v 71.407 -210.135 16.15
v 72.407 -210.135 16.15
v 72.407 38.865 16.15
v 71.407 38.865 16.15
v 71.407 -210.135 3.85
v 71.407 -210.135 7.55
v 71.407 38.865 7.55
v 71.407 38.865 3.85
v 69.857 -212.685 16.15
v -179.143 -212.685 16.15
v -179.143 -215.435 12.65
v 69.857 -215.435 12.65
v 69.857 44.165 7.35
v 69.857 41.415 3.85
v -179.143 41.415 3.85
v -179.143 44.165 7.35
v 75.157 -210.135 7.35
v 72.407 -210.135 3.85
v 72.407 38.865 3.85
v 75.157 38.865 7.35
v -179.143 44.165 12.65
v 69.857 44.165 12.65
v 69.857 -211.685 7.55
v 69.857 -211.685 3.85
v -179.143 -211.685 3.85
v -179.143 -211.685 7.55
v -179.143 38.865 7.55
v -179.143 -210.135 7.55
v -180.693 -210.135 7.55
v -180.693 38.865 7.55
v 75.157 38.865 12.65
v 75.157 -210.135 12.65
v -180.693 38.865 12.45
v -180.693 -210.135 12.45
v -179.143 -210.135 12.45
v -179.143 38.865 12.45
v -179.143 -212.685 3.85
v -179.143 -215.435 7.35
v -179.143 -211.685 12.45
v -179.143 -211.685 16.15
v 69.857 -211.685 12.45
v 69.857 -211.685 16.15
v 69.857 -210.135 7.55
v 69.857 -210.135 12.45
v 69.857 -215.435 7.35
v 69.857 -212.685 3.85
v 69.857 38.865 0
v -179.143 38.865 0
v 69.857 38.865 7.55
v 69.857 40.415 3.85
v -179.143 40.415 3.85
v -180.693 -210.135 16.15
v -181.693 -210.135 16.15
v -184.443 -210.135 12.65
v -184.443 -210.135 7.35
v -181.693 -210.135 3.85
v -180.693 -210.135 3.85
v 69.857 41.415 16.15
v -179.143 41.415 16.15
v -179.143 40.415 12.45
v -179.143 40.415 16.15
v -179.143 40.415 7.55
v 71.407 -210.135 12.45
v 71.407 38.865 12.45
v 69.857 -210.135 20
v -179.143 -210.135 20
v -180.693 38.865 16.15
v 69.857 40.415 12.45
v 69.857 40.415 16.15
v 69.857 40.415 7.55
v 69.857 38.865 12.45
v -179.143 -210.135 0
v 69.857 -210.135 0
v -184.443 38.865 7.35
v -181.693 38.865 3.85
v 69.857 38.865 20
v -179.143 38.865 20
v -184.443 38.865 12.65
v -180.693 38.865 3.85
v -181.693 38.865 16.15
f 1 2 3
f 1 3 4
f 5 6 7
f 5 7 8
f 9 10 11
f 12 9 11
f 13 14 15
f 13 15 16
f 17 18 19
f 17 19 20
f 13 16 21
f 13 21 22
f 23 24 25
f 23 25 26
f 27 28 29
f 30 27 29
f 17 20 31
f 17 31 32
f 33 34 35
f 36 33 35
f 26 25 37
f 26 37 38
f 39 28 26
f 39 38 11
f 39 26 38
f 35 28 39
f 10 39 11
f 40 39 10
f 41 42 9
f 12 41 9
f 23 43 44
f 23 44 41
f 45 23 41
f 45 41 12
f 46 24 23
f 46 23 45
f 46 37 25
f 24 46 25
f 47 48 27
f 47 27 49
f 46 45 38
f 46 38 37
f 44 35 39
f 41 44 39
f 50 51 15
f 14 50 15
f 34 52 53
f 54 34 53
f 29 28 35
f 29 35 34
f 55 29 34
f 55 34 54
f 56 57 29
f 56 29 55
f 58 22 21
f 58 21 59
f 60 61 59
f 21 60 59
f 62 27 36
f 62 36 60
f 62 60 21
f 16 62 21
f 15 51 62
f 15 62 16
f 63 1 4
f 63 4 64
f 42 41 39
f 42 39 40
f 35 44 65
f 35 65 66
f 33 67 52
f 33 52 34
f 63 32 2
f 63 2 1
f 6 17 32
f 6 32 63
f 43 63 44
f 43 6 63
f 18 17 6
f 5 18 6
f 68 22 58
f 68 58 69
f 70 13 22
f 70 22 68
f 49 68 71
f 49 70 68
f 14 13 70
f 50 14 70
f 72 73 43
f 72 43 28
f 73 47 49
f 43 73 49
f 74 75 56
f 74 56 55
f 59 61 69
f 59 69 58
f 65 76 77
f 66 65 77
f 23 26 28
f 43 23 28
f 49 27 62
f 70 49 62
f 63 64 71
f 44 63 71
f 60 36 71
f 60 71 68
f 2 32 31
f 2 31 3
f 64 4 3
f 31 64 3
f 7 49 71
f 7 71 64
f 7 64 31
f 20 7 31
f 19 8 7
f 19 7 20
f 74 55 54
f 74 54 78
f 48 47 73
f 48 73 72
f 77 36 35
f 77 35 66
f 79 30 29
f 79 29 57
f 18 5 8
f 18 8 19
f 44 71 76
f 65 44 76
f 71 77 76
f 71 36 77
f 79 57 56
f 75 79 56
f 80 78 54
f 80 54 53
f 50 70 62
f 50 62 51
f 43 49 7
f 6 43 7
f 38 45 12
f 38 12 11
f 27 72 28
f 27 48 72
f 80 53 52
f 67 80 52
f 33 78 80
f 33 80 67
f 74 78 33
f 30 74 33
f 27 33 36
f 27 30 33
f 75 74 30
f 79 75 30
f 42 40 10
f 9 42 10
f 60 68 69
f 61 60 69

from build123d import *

# Parameters (mm, degrees)
BOSS_EXTRU_1_DEPTH           = 20
ENL_V_MAT_EXTRU_1_DEPTH      = 334.887542768
ENL_V_MAT_EXTRU_1_DEPTH_BACK = 249
ENL_V_MAT_EXTRU_2_DEPTH      = 334.887542768
ENL_V_MAT_EXTRU_2_DEPTH_BACK = 249
ENL_V_MAT_EXTRU_3_DEPTH      = 315.78213111
ENL_V_MAT_EXTRU_3_DEPTH_BACK = 249
ENL_V_MAT_EXTRU_4_DEPTH      = 315.78213111
ENL_V_MAT_EXTRU_4_DEPTH_BACK = 249
ENL_V_MAT_EXTRU_5_DEPTH      = 334.887542768
ENL_V_MAT_EXTRU_5_DEPTH_BACK = 249
ENL_V_MAT_EXTRU_6_DEPTH      = 334.887542768
ENL_V_MAT_EXTRU_6_DEPTH_BACK = 249
ENL_V_MAT_EXTRU_7_DEPTH      = 315.78213111
ENL_V_MAT_EXTRU_7_DEPTH_BACK = 249
ENL_V_MAT_EXTRU_8_DEPTH      = 315.78213111
ENL_V_MAT_EXTRU_8_DEPTH_BACK = 249


with BuildPart() as part:
    # Esquisse1 → Boss.-Extru.1 (new body)
    with BuildSketch(Plane.XY):
        Polygon((-179.143216373, 44.164624039), (69.856783627, 44.164624039), (69.856783627, 38.864624039), (75.156783627, 38.864624039), (75.156783627, -210.135375961), (69.856783627, -210.135375961), (69.856783627, -215.435375961), (-179.143216373, -215.435375961), (-179.143216373, -210.135375961), (-184.443216373, -210.135375961), (-184.443216373, 38.864624039), (-179.143216373, 38.864624039), align=None)
    extrude(amount=BOSS_EXTRU_1_DEPTH)

    # Esquisse2 → Enlèv. mat.-Extru.1 (cut, two sides: drawn at the far end of the back side and taken through both)
    with BuildSketch(Plane.ZY.offset(179.143216373).offset(-ENL_V_MAT_EXTRU_1_DEPTH_BACK)):
        Polygon((-529.816054004, 38.864624039), (0, 38.864624039), (7.55, 38.864624039), (7.55, 40.414624039), (3.85, 40.414624039), (3.85, 41.414624039), (7.35, 44.164624039), (423.954079466, 371.496400762), (75.014402763, 1372.026913212), (-878.755730707, 1039.395136489), align=None)
    extrude(amount=ENL_V_MAT_EXTRU_1_DEPTH + ENL_V_MAT_EXTRU_1_DEPTH_BACK, mode=Mode.SUBTRACT)

    # Esquisse3 → Enlèv. mat.-Extru.2 (cut, two sides: drawn at the far end of the back side and taken through both)
    with BuildSketch(Plane.ZY.offset(179.143216373).offset(-ENL_V_MAT_EXTRU_2_DEPTH_BACK)):
        Polygon((549.816054004, 38.864624039), (20, 38.864624039), (12.45, 38.864624039), (12.45, 40.414624039), (16.15, 40.414624039), (16.15, 41.414624039), (12.65, 44.164624039), (-403.954079466, 371.496400762), (-55.014402763, 1372.026913212), (898.755730707, 1039.395136489), align=None)
    extrude(amount=ENL_V_MAT_EXTRU_2_DEPTH + ENL_V_MAT_EXTRU_2_DEPTH_BACK, mode=Mode.SUBTRACT)

    # Esquisse5 → Enlèv. mat.-Extru.3 (cut, two sides: drawn at the far end of the back side and taken through both)
    with BuildSketch(Plane(origin=(0, -210.135375961, 0), x_dir=(-1, 0, 0), z_dir=(0, -1, 0)).offset(-ENL_V_MAT_EXTRU_3_DEPTH_BACK)):
        Polygon((179.143216373, 529.816054004), (179.143216373, 0), (179.143216373, -7.55), (180.693216373, -7.55), (180.693216373, -3.85), (181.693216373, -3.85), (184.443216373, -7.35), (511.774993096, -423.954079466), (1512.305505546, -75.014402763), (1179.673728823, 878.755730707), align=None)
    extrude(amount=ENL_V_MAT_EXTRU_3_DEPTH + ENL_V_MAT_EXTRU_3_DEPTH_BACK, mode=Mode.SUBTRACT)

    # Esquisse6 → Enlèv. mat.-Extru.4 (cut, two sides: drawn at the far end of the back side and taken through both)
    with BuildSketch(Plane(origin=(0, -210.135375961, 0), x_dir=(-1, 0, 0), z_dir=(0, -1, 0)).offset(-ENL_V_MAT_EXTRU_4_DEPTH_BACK)):
        Polygon((511.774993096, 403.954079466), (184.443216373, -12.65), (181.693216373, -16.15), (180.693216373, -16.15), (180.693216373, -12.45), (179.143216373, -12.45), (179.143216373, -20), (179.143216373, -549.816054004), (1179.673728823, -898.755730707), (1512.305505546, 55.014402763), align=None)
    extrude(amount=ENL_V_MAT_EXTRU_4_DEPTH + ENL_V_MAT_EXTRU_4_DEPTH_BACK, mode=Mode.SUBTRACT)

    # Esquisse8 → Enlèv. mat.-Extru.5 (cut, two sides: drawn at the far end of the back side and taken through both)
    with BuildSketch(Plane.ZY.offset(179.143216373).offset(-ENL_V_MAT_EXTRU_5_DEPTH_BACK)):
        Polygon((20, -210.135375961), (12.45, -210.135375961), (12.45, -211.685375961), (16.15, -211.685375961), (16.15, -212.685375961), (12.65, -215.435375961), (20, -215.435375961), align=None)
    extrude(amount=ENL_V_MAT_EXTRU_5_DEPTH + ENL_V_MAT_EXTRU_5_DEPTH_BACK, mode=Mode.SUBTRACT)

    # Esquisse9 → Enlèv. mat.-Extru.6 (cut, two sides: drawn at the far end of the back side and taken through both)
    with BuildSketch(Plane.ZY.offset(179.143216373).offset(-ENL_V_MAT_EXTRU_6_DEPTH_BACK)):
        Polygon((423.954079466, -542.767152684), (7.35, -215.435375961), (3.85, -212.685375961), (3.85, -211.685375961), (7.55, -211.685375961), (7.55, -210.135375961), (0, -210.135375961), (-529.816054004, -210.135375961), (-878.755730707, -1210.665888411), (75.014402763, -1543.297665134), align=None)
    extrude(amount=ENL_V_MAT_EXTRU_6_DEPTH + ENL_V_MAT_EXTRU_6_DEPTH_BACK, mode=Mode.SUBTRACT)

    # Esquisse11 → Enlèv. mat.-Extru.7 (cut, two sides: drawn at the far end of the back side and taken through both)
    with BuildSketch(Plane(origin=(0, 38.864624039, 0), x_dir=(1, 0, 0), z_dir=(0, 1, 0)).offset(-ENL_V_MAT_EXTRU_7_DEPTH_BACK)):
        Polygon((69.856783627, 0), (69.856783627, -7.55), (71.406783627, -7.55), (71.406783627, -3.85), (72.406783627, -3.85), (75.156783627, -7.35), (75.156783627, 0), align=None)
    extrude(amount=ENL_V_MAT_EXTRU_7_DEPTH + ENL_V_MAT_EXTRU_7_DEPTH_BACK, mode=Mode.SUBTRACT)

    # Esquisse12 → Enlèv. mat.-Extru.8 (cut, two sides: drawn at the far end of the back side and taken through both)
    with BuildSketch(Plane(origin=(0, 38.864624039, 0), x_dir=(1, 0, 0), z_dir=(0, 1, 0)).offset(-ENL_V_MAT_EXTRU_8_DEPTH_BACK)):
        Polygon((402.48856035, 403.954079466), (75.156783627, -12.65), (72.406783627, -16.15), (71.406783627, -16.15), (71.406783627, -12.45), (69.856783627, -12.45), (69.856783627, -20), (69.856783627, -549.816054004), (1070.387296077, -898.755730707), (1403.0190728, 55.014402763), align=None)
    extrude(amount=ENL_V_MAT_EXTRU_8_DEPTH + ENL_V_MAT_EXTRU_8_DEPTH_BACK, mode=Mode.SUBTRACT)


solid = part.part
